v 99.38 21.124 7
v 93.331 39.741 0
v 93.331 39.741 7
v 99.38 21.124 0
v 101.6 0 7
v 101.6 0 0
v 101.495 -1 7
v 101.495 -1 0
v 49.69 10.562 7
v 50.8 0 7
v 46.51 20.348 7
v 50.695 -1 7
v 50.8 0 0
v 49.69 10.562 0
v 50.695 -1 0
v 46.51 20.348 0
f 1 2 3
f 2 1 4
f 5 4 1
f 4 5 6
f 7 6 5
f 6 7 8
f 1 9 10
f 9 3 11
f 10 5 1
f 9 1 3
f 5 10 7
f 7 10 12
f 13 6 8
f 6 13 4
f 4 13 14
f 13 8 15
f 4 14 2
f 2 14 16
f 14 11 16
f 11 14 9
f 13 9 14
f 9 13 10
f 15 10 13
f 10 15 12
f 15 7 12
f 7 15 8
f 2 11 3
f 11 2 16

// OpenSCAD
// file: params.scad
hole_radius = 5;
peg_radius = 4.5;

mag_height = 7;
mag_ring_ir = 50.8;
mag_ring_or = 101.6;
mag_count = 16;

rotor_height = 10;
rotor_inner_height = 3;
rotor_diameter = 105;
rotor_inner_diameter = 25;
rotor_count = 8;
rotor_incidence = 360/rotor_count;
// main file
include <params.scad>


module ring() {
	difference() {
		cylinder(h=mag_height, r=mag_ring_or);
		translate([0, 0, -1]) cylinder(h=mag_height+2, r=mag_ring_ir);
	}
}

module block() { cube([(mag_ring_or*2)+2, mag_ring_or+2, mag_height+2]); }

module magnet() {
	intersection() {
		ring();
		translate([-mag_ring_or-1, -1, -1]) block();
		rotate(v=[0,0,1], a=360/mag_count) translate([-mag_ring_or-1, -mag_ring_or-1, -1]) block();
	}
}


magnet();
